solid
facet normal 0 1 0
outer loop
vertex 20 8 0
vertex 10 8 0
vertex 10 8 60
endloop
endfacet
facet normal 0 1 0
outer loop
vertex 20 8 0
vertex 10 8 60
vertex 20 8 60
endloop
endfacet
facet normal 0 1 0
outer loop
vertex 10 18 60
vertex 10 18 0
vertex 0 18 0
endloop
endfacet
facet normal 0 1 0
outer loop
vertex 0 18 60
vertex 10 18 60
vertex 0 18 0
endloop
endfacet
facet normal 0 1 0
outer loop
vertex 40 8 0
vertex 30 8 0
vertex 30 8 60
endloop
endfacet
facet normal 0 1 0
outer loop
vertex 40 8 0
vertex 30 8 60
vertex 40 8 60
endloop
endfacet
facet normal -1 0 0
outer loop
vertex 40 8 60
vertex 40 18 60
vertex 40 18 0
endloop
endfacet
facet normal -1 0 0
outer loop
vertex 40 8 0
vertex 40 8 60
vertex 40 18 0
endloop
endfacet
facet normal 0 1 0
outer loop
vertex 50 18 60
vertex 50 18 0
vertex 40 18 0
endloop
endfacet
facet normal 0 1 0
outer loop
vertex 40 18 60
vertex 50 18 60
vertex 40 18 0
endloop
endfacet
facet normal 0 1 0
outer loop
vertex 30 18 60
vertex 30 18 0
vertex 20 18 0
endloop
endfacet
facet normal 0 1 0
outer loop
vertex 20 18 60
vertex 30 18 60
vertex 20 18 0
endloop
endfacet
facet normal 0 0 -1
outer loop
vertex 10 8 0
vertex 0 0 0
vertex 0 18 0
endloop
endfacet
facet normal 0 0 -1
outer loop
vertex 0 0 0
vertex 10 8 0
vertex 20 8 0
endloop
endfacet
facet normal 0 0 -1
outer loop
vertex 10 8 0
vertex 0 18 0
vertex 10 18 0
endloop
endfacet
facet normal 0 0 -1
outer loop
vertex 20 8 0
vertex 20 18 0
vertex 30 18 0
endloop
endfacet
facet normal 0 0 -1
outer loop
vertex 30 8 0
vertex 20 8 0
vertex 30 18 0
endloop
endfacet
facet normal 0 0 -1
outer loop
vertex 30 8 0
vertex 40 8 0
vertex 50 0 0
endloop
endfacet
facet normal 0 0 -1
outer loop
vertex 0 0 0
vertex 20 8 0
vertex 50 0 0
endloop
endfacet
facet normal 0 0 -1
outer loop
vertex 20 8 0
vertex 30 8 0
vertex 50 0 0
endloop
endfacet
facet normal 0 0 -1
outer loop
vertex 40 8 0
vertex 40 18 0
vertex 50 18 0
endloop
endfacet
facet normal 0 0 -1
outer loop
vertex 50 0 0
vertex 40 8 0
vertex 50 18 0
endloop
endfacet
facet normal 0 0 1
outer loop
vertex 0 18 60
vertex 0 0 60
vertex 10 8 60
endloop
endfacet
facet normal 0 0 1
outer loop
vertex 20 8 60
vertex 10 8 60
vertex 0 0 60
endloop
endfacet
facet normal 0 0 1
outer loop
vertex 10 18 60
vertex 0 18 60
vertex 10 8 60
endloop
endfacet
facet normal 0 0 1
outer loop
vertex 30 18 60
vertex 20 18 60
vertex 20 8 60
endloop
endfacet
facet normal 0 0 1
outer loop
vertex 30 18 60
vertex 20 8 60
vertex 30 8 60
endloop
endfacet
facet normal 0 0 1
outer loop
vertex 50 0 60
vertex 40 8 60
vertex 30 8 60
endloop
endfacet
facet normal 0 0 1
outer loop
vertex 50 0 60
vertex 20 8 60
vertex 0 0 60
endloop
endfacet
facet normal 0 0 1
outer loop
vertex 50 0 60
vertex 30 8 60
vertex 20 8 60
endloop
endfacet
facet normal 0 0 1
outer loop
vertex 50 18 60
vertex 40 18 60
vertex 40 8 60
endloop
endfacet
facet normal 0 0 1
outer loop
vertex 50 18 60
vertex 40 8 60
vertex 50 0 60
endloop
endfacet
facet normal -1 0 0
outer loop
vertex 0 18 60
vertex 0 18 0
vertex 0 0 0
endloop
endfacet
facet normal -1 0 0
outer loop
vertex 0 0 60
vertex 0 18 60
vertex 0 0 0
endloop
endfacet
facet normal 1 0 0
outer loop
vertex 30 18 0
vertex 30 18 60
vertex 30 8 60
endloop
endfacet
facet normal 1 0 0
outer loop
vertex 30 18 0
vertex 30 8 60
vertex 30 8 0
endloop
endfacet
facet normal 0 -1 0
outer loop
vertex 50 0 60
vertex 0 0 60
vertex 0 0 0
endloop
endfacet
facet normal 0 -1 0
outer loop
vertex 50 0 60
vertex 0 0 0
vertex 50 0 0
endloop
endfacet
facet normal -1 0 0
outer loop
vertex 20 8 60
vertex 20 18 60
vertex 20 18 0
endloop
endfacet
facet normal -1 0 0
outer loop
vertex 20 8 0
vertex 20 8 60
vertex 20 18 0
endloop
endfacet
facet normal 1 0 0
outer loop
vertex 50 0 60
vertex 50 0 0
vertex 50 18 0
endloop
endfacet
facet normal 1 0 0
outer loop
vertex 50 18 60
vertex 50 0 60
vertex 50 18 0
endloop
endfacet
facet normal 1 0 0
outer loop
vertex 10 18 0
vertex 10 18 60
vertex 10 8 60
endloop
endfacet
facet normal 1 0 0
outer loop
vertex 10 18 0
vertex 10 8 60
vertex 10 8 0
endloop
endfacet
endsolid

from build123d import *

# Parameters (mm, degrees)
BOSS_EXTRU_1_DEPTH      = 60
ESQUISSE2_W             = 10
ESQUISSE2_H             = 70.243389495
ENL_V_MAT_EXTRU_1_DEPTH = 10


with BuildPart() as part:
    # Esquisse1 → Boss.-Extru.1 (new body)
    with BuildSketch(Plane.XY):
        Polygon((0, 0), (50, 0), (50, 9), (50, 18), (0, 18), align=None)
    extrude(amount=BOSS_EXTRU_1_DEPTH)

    # Esquisse2 → Enlèv. mat.-Extru.1 (cut)
    with BuildSketch(Plane(origin=(0, 18, 0), x_dir=(1, 0, 0), z_dir=(0, 1, 0))):
        with Locations((15, -30.175170548)):
            Rectangle(ESQUISSE2_W, ESQUISSE2_H)
        with Locations((35, -30.175170548)):
            Rectangle(ESQUISSE2_W, ESQUISSE2_H)
    extrude(amount=-ENL_V_MAT_EXTRU_1_DEPTH, mode=Mode.SUBTRACT)


solid = part.part
